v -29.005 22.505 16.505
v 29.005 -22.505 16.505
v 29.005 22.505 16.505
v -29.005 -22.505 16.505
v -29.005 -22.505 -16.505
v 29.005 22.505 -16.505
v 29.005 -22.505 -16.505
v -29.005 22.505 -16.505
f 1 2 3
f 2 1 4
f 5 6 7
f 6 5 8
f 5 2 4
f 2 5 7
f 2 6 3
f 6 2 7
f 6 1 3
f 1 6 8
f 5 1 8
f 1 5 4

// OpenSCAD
$fn = 64;

// Solid State Relay module overall size (mm)
L = 58.0;   // length (X)
W = 45.0;   // width  (Y)
H = 33.0;   // height (Z)

module ssr_module() {
    // Ensure a visible, non-degenerate, single connected solid
    // (use a tiny epsilon to avoid any zero-thickness edge cases in some renderers)
    eps = 0.01;

    cube([L, W, H] + [eps, eps, eps], center=true);
}

ssr_module();
